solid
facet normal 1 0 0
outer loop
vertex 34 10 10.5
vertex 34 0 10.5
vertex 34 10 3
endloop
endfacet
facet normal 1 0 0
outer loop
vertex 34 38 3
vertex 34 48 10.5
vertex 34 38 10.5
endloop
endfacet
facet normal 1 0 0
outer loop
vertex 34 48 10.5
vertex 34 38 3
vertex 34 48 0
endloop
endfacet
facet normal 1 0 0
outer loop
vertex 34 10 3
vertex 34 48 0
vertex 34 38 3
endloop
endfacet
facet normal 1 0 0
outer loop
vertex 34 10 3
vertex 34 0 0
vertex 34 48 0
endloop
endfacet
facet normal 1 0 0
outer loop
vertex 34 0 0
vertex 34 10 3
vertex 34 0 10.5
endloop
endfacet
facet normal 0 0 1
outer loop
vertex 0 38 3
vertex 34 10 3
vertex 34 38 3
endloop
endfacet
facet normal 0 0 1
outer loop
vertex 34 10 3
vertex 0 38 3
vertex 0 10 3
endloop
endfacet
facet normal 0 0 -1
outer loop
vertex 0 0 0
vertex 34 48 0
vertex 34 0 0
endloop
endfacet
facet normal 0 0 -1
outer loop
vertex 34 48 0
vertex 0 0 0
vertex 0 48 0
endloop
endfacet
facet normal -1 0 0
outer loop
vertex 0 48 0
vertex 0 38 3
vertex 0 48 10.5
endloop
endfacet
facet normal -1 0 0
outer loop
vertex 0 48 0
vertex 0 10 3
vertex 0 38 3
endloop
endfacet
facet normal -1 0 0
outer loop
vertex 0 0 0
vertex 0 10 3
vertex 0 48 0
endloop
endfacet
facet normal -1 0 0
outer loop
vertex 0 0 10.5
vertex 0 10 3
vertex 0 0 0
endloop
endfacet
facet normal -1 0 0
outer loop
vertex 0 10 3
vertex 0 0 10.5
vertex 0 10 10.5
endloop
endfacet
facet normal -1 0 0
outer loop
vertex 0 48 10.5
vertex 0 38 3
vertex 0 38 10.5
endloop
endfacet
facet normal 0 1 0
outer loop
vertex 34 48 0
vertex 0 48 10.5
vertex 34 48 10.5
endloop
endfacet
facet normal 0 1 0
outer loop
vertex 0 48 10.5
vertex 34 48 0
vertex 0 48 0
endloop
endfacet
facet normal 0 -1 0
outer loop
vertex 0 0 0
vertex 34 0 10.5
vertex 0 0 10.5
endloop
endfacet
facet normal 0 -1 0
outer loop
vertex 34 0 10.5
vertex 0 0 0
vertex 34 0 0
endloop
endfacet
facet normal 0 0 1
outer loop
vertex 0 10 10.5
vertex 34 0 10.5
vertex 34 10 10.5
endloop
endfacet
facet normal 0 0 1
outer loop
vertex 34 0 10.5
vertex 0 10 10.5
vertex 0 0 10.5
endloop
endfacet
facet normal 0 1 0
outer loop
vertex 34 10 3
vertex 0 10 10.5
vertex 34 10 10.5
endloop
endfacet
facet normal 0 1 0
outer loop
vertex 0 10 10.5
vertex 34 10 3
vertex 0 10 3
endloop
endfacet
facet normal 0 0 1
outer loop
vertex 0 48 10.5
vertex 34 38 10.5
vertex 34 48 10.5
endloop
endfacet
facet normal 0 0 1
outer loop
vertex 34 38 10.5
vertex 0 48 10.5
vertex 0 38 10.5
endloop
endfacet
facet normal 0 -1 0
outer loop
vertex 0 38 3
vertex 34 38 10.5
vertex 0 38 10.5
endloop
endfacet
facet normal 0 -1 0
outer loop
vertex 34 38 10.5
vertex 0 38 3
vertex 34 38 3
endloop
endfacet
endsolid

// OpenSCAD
width = 34;
height = 10.5;
minimumHeight = 3;
strip = 10; 
spacing = 28;

cube([width,spacing+2*strip,minimumHeight]);
cube([width,strip,height]);
translate([0,strip+spacing,0]) cube([width,strip,height]);
